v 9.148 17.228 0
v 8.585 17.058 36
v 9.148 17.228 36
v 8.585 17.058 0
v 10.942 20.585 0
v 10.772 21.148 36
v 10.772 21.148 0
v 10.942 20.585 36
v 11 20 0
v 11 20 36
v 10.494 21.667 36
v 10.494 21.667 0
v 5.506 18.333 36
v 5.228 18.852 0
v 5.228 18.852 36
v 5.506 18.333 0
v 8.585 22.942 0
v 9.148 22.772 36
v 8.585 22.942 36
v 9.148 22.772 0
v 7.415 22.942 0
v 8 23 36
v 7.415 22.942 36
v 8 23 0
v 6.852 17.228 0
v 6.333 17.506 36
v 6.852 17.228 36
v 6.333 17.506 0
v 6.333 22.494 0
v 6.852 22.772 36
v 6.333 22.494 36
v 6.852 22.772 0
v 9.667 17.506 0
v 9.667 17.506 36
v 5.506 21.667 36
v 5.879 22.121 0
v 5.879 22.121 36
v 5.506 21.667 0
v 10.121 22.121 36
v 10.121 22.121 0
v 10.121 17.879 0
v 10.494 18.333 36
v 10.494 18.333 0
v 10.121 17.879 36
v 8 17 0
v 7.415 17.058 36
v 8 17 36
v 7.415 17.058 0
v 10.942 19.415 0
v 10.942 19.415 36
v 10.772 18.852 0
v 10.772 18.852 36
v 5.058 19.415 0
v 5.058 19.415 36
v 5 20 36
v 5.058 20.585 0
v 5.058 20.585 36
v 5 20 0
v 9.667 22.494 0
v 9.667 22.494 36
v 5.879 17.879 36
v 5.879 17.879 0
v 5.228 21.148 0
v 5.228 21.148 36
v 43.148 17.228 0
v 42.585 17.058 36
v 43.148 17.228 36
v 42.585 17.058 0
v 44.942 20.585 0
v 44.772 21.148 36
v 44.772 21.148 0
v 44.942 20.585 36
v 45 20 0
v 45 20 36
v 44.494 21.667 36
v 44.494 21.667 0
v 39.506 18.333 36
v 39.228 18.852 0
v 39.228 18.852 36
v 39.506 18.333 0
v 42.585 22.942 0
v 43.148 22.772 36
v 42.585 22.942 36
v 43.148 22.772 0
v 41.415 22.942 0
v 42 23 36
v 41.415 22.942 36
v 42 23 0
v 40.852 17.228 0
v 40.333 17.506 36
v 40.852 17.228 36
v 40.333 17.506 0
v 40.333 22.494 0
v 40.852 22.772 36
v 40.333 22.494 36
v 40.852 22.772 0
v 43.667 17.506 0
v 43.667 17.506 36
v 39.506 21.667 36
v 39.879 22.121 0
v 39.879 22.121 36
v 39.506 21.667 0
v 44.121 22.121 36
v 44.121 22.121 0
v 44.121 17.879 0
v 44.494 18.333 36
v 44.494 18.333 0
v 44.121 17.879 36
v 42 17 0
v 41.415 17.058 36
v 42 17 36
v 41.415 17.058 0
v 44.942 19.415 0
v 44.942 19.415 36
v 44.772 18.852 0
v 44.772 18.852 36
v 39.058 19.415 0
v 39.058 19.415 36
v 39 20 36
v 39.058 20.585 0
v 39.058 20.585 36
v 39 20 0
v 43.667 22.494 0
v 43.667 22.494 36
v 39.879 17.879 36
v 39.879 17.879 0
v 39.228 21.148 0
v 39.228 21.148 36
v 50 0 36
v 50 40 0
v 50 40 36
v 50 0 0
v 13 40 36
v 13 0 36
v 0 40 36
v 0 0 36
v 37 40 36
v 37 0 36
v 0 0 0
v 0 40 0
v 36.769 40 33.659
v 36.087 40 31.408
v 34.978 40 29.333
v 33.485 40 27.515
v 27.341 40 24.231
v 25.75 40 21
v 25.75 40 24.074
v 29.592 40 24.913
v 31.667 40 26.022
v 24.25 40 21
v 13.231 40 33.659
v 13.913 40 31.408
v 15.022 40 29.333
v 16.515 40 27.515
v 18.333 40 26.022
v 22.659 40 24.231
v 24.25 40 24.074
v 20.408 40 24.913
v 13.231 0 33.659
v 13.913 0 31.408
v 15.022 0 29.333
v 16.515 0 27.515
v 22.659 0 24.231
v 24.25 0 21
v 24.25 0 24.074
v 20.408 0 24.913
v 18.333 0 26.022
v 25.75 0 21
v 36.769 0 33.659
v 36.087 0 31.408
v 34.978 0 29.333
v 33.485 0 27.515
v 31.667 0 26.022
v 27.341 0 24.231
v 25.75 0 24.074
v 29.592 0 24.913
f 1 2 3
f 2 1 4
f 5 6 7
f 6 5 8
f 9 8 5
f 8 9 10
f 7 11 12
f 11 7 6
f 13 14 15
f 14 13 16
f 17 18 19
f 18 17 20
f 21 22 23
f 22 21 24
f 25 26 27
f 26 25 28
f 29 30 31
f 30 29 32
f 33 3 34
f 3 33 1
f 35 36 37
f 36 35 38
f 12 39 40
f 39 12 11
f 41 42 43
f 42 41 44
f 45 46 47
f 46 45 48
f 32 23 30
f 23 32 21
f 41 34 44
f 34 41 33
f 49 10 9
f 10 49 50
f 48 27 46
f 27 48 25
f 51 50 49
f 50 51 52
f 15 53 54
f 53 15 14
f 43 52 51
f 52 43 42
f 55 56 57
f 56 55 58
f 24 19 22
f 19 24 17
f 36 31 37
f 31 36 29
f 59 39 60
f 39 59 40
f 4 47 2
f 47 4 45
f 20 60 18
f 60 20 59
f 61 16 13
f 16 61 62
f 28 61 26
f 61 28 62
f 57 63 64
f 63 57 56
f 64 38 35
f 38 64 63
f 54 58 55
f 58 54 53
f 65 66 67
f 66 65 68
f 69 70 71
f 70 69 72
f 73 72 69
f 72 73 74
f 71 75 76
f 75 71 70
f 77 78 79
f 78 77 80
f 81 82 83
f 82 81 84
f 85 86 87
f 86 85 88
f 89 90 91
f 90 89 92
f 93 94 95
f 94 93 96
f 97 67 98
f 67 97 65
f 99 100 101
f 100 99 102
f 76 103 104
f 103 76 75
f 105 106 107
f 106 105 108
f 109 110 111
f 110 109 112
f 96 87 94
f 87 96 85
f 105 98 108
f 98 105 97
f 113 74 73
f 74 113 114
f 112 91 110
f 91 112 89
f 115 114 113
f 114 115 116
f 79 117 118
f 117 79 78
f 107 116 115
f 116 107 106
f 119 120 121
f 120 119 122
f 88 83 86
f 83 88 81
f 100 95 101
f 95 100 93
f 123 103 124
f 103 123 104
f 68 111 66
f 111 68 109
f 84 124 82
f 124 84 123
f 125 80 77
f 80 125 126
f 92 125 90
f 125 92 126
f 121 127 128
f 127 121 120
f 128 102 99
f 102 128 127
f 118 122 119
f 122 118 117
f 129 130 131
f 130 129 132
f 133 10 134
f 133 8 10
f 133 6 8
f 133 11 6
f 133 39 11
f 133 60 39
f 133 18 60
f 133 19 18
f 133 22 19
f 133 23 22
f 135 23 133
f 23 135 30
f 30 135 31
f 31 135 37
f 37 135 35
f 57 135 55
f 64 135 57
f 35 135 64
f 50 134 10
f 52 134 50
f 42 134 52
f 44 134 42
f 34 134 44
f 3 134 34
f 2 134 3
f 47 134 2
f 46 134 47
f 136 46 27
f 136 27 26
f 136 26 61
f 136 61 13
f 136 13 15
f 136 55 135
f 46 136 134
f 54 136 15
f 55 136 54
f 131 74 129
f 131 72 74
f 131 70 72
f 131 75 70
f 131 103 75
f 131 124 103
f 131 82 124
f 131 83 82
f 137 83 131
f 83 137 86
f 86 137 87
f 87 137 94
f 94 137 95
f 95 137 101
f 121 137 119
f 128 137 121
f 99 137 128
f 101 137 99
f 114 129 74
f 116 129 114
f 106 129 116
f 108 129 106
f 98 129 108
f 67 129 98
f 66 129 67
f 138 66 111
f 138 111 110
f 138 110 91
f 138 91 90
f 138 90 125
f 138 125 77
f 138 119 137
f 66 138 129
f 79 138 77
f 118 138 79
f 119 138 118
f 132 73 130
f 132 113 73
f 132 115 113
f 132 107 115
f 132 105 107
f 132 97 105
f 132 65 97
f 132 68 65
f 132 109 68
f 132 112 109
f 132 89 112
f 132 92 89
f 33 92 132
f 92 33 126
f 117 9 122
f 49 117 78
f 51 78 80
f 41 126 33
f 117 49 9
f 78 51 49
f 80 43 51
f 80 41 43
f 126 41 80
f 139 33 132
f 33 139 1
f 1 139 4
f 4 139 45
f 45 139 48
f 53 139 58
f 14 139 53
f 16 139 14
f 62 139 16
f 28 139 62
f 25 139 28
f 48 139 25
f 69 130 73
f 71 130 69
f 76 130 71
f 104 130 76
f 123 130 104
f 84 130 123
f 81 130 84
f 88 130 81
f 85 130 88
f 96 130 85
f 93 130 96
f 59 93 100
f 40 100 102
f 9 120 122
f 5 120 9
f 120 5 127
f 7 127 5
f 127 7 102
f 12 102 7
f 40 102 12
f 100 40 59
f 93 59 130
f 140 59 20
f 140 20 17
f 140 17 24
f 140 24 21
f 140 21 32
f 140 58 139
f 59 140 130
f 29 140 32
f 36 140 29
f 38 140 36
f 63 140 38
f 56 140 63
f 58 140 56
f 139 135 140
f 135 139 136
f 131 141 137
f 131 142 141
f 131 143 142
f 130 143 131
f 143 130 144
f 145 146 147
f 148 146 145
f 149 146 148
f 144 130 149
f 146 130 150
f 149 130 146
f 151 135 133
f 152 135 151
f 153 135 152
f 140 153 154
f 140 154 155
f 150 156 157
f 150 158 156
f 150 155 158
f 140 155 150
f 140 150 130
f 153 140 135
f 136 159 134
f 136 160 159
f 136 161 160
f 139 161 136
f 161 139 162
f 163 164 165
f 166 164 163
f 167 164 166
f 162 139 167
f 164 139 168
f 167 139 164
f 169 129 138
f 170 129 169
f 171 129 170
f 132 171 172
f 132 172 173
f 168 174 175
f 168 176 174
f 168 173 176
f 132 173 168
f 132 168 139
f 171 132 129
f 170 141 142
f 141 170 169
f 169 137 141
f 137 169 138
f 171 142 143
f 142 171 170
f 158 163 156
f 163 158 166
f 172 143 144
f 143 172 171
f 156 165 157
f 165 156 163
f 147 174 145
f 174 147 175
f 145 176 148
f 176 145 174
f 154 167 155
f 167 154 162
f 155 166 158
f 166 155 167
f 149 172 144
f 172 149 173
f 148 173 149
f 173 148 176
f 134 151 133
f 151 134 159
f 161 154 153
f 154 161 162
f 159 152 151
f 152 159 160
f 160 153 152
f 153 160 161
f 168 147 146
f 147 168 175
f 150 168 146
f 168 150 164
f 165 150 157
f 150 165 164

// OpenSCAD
$fn = 32;

// ----------------------------------------------------------------------
// Saddle clamp: split shaft clamp
// ----------------------------------------------------------------------

// --- parameters (mm) ---
blk_l = 50;               // block length, X
blk_w = 40;               // block width, Y
blk_h = 36;               // block height
clamp_r = 12;             // shaft groove radius
hole_r = 3;               // bolt hole radius
hole_m = 8;               // bolt hole margin from the ends
saw_w = 1.5;              // saw kerf width

saw_depth = clamp_r + 3;  // saw kerf depth

difference() {
  cube([blk_l, blk_w, blk_h]);
  translate([blk_l / 2, -1, blk_h])
    rotate([-90, 0, 0])
      cylinder(h = blk_w + 2, r = clamp_r);
  for (sx = [0, 1])
    translate([sx ? blk_l - hole_m : hole_m, blk_w / 2, -1])
      cylinder(r = hole_r, h = blk_h + 2);
  translate([blk_l / 2 - saw_w / 2, -1, blk_h - saw_depth])
    cube([saw_w, blk_w + 2, saw_depth + 1]);
}
